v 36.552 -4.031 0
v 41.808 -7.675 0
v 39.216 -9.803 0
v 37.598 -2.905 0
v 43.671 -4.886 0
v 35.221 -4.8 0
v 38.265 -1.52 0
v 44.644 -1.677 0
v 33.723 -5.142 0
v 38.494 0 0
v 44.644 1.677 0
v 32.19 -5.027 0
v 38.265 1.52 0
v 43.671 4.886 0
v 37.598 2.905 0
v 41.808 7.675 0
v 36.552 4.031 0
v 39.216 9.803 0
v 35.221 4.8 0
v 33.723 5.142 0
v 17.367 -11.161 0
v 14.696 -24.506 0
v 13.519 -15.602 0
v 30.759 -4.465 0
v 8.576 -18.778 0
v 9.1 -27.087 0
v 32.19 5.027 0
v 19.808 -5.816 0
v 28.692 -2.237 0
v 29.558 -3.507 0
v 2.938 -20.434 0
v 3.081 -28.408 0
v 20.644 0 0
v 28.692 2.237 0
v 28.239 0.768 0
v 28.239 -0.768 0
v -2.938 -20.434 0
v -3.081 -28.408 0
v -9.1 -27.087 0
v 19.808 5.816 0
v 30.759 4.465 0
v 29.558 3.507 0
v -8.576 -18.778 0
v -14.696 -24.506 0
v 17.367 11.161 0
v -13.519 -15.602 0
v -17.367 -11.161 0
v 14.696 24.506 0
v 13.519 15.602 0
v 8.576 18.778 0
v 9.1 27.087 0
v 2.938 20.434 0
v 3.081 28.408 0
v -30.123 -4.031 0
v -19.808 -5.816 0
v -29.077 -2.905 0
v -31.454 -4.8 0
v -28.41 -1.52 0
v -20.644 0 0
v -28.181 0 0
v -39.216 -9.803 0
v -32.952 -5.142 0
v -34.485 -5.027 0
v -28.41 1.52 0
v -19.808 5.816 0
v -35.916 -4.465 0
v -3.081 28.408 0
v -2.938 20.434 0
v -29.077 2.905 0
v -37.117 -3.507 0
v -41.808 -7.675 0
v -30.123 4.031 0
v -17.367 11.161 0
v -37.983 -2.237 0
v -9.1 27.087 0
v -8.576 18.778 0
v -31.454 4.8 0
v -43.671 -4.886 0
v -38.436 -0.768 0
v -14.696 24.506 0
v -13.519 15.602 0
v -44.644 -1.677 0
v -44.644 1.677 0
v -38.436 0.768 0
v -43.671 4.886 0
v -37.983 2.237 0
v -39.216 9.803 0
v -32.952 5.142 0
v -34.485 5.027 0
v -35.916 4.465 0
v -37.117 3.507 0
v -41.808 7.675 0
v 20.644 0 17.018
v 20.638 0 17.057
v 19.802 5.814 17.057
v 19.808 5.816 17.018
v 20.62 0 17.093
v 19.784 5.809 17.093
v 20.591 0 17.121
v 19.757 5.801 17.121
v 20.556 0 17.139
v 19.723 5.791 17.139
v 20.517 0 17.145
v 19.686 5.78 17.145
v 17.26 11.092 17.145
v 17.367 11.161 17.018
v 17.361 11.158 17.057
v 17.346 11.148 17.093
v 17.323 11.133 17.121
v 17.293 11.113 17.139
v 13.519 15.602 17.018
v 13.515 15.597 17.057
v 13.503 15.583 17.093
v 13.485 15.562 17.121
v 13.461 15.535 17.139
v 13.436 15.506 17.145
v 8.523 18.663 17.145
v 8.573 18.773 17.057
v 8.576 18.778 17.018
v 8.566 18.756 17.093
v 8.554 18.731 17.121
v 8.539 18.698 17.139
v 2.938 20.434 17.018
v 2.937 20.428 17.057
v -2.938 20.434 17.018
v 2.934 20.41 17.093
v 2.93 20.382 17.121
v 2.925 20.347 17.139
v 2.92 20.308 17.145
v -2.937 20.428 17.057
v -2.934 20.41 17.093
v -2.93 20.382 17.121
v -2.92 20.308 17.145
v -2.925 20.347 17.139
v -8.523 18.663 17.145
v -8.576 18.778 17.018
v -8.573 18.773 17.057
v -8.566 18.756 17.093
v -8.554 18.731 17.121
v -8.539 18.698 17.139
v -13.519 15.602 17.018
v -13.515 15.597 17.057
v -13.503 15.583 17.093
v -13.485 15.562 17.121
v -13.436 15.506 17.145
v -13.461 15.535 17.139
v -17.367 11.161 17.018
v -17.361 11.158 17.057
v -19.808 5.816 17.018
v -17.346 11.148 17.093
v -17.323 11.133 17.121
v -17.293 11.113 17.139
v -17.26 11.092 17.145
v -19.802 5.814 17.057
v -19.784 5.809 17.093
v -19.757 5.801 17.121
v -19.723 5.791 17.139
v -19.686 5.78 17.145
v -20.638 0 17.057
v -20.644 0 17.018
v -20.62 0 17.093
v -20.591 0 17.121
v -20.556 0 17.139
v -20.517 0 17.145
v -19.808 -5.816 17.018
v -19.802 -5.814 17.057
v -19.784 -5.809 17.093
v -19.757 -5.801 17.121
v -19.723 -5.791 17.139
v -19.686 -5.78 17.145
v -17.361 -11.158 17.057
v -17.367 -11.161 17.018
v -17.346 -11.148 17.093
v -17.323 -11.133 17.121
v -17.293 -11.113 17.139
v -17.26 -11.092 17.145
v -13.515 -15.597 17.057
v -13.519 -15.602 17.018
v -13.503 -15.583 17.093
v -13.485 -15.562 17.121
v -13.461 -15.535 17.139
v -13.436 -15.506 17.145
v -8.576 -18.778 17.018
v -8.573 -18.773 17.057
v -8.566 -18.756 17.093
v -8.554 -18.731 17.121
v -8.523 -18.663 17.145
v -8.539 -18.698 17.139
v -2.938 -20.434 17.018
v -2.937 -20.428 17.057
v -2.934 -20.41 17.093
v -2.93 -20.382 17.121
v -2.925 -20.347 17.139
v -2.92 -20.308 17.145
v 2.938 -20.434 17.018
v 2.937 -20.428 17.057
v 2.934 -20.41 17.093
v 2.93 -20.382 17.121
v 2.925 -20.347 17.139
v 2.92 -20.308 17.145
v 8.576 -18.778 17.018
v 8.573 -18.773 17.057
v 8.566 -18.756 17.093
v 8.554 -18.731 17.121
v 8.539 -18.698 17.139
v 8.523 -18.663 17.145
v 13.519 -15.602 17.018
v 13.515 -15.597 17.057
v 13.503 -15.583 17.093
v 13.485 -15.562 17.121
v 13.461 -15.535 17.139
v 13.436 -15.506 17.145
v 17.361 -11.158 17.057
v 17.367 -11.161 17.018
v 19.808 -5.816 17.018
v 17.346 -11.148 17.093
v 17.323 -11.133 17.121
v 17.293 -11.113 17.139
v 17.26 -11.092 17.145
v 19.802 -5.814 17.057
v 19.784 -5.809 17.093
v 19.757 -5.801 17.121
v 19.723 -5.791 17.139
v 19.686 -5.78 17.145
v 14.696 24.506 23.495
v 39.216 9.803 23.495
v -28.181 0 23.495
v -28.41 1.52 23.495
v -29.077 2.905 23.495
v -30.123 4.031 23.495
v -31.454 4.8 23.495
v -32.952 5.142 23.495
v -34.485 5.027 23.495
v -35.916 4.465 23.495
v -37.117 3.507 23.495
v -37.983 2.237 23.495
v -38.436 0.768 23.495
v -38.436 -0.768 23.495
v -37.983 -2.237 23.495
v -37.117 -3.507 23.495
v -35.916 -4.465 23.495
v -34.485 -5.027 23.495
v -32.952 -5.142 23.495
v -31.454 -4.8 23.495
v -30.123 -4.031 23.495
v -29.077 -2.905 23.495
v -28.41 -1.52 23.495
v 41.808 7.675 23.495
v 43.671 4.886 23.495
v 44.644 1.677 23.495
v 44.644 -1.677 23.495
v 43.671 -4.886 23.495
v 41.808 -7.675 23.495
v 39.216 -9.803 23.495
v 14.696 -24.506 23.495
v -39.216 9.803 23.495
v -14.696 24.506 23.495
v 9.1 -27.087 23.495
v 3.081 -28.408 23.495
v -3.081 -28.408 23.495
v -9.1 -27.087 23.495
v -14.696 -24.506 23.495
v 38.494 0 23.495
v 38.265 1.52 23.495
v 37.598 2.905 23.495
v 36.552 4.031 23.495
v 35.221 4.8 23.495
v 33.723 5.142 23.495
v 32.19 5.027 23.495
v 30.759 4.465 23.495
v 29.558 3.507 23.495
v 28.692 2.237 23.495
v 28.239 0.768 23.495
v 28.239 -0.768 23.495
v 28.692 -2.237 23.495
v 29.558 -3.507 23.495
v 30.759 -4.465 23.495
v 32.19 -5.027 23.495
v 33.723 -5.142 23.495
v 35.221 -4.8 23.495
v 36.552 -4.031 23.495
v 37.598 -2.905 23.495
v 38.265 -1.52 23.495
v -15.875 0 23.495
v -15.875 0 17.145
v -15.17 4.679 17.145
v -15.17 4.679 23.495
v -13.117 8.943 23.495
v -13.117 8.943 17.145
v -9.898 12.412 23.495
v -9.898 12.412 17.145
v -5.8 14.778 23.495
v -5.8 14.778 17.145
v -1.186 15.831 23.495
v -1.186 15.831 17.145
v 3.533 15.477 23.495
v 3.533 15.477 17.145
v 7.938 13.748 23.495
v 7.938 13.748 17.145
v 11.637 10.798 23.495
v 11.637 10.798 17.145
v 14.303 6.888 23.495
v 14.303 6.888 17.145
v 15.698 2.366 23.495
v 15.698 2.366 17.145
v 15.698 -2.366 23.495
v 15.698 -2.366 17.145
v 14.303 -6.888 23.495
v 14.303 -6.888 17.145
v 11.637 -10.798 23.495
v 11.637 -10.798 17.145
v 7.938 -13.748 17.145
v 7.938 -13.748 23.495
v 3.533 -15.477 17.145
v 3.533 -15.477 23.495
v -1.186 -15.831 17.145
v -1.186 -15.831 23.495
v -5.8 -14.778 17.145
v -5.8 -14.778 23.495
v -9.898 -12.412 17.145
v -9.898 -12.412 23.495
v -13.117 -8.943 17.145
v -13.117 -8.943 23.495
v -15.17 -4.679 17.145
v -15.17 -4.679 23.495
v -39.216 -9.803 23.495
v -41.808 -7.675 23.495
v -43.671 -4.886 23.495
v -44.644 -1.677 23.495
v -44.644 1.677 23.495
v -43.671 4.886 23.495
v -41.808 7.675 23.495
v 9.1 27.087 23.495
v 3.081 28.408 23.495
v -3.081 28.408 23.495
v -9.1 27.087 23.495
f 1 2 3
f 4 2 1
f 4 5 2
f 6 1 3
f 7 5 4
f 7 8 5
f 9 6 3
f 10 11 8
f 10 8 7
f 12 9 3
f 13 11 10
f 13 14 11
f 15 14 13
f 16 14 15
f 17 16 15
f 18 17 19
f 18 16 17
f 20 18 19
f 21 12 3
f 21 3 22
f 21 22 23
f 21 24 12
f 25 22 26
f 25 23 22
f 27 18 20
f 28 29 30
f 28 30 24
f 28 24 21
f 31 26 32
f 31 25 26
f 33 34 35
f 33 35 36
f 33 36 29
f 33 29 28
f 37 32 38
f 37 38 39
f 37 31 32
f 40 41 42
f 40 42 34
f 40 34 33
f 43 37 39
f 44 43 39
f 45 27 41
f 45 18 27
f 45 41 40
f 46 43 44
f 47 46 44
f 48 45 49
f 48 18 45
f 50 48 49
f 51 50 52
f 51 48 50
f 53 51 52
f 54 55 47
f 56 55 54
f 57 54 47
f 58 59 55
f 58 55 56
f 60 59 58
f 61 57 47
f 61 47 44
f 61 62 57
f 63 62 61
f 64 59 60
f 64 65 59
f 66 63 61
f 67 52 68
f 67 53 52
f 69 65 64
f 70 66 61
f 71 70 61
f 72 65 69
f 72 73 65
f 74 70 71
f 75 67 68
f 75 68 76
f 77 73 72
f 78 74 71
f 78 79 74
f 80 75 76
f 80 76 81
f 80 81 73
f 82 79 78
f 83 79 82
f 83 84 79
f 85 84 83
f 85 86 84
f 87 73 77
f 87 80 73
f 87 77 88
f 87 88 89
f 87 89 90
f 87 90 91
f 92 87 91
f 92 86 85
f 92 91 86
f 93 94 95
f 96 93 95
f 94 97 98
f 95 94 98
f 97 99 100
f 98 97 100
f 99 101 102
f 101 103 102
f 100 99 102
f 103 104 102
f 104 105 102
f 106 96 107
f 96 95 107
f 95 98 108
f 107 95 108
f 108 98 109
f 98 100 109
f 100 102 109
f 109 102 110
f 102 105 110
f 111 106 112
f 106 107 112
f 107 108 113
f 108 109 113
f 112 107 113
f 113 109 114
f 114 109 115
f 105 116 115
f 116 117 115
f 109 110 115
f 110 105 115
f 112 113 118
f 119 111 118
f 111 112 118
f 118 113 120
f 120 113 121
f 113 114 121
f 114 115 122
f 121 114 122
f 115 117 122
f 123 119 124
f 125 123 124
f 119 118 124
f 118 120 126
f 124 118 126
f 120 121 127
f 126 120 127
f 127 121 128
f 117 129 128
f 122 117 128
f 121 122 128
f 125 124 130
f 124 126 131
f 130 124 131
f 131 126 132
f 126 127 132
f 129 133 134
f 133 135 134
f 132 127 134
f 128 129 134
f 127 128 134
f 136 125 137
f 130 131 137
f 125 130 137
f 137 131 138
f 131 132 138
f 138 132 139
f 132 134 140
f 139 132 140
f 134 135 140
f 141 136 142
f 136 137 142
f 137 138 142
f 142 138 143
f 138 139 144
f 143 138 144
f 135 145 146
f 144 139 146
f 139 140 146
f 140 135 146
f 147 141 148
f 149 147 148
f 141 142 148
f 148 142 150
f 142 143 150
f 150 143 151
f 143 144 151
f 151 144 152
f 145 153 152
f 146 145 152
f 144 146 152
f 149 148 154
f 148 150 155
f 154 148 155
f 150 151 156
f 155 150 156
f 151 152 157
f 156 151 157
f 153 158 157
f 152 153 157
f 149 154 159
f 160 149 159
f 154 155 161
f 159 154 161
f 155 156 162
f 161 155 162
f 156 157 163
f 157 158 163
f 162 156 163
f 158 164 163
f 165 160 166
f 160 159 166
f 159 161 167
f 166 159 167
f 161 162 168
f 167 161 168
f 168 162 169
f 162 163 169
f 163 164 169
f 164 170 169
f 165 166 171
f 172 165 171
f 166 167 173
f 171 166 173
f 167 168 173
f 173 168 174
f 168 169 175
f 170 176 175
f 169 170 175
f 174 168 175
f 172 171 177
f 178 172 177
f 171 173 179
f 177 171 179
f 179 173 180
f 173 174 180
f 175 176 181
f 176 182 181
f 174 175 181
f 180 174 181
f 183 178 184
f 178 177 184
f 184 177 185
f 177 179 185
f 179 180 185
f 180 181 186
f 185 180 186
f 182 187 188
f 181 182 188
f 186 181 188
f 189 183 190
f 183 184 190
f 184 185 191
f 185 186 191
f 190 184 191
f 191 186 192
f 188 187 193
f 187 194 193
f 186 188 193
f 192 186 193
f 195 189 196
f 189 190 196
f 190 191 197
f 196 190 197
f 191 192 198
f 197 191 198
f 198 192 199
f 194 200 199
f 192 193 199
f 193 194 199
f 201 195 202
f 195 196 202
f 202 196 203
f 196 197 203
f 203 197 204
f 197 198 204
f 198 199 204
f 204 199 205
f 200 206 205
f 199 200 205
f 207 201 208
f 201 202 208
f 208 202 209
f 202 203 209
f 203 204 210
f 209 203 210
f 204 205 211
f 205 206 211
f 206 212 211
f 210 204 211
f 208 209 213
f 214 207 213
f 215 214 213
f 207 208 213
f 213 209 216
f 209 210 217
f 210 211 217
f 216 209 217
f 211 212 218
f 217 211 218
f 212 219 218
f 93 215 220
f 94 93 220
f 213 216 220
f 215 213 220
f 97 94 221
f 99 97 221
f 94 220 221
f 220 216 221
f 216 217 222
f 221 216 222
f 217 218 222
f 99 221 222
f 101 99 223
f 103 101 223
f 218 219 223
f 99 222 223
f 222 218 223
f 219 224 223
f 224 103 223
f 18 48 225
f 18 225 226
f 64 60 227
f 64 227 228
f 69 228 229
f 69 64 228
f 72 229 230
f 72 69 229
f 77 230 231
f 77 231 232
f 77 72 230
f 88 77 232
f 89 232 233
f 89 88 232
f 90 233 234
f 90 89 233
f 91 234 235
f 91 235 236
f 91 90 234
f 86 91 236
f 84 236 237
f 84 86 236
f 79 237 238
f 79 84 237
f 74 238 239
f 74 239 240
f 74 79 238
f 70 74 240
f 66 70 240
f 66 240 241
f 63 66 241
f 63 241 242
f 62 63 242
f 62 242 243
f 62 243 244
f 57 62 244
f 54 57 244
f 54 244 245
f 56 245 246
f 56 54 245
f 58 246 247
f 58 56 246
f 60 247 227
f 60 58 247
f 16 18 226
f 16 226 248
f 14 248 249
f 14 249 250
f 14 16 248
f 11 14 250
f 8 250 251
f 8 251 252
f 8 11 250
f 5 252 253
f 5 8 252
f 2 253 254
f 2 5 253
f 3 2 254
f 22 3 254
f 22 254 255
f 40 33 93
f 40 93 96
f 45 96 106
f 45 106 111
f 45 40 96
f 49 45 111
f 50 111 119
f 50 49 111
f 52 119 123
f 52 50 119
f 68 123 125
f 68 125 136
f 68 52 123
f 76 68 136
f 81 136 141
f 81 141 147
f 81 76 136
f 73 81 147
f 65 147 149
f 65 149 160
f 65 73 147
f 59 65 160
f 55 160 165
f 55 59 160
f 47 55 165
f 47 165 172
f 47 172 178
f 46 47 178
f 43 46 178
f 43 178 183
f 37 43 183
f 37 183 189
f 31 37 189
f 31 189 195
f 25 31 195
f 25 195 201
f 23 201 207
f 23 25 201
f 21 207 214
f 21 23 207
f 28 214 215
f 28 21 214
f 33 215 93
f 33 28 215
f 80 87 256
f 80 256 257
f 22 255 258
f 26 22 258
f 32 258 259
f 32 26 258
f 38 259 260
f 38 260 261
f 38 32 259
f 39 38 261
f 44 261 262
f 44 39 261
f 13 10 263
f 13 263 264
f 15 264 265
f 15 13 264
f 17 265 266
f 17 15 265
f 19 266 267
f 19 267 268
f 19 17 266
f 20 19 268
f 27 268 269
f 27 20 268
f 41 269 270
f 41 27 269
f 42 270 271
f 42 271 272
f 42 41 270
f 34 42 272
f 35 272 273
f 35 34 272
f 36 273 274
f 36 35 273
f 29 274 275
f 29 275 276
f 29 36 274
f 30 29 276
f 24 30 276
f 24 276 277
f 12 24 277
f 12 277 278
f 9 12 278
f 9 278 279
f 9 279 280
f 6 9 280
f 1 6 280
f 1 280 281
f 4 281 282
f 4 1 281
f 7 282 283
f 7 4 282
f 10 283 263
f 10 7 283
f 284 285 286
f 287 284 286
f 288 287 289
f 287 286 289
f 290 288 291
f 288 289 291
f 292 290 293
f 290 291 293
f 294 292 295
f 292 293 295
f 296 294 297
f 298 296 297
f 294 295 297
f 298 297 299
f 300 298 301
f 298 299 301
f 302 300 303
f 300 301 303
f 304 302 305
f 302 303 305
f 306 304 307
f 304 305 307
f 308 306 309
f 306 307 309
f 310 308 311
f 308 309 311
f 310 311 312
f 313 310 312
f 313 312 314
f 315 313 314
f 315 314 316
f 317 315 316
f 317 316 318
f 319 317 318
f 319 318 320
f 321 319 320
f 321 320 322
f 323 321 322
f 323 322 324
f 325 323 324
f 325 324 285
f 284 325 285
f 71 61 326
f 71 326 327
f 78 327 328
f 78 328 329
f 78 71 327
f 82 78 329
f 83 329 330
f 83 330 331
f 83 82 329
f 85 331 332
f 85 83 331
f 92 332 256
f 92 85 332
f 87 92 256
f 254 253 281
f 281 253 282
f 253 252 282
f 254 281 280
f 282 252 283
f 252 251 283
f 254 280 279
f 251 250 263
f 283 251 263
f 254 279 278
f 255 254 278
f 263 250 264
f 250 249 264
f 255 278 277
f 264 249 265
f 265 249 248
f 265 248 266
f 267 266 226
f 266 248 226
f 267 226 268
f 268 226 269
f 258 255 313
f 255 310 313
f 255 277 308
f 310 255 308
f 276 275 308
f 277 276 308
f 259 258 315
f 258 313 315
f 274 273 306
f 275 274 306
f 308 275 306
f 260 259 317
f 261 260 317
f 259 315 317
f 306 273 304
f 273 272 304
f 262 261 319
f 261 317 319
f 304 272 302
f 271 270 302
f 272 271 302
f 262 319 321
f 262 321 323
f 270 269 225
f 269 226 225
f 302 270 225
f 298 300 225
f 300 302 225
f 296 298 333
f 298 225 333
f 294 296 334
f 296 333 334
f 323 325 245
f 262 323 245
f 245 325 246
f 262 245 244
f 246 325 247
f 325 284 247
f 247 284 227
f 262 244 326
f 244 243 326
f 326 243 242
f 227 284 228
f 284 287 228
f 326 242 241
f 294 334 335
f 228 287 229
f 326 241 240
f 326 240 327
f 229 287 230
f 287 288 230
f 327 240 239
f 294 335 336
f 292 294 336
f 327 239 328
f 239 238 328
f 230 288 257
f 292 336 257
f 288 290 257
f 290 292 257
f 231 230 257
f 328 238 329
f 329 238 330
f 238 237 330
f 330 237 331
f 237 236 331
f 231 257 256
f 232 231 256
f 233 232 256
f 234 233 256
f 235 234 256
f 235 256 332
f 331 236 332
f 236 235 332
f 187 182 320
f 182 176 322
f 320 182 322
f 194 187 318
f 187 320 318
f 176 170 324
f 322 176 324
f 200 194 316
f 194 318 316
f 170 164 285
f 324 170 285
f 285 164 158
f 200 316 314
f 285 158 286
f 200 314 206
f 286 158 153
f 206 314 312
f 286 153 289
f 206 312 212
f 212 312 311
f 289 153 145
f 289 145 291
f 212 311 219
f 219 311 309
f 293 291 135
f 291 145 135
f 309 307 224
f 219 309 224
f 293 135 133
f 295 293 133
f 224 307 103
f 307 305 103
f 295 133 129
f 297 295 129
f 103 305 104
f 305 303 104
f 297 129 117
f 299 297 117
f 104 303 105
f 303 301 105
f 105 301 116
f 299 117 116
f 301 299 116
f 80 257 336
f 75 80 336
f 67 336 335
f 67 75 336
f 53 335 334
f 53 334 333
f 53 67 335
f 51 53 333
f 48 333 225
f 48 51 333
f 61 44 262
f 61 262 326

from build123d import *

# Parameters (mm, degrees)
SKETCH1_R          = 5.1562
EXTRUDE1_DEPTH     = 23.495
SKETCH6_R          = 20.64385
CUT_EXTRUDE1_DEPTH = 17.145
SKETCH7_R          = 15.875
CUT_EXTRUDE2_DEPTH = 7.35
FILLET1_R          = 0.127


with BuildPart() as part:
    # Sketch1 → Extrude1 (new body)
    with BuildSketch(Plane.XY):
        with BuildLine():
            Line((-39.215785714, 9.802584203), (-14.695714286, 24.506460508))
            ThreePointArc((-14.695714286, 24.506460508), (0, 28.575), (14.695714286, 24.506460508))
            Line((14.695714286, 24.506460508), (39.215785714, 9.802584203))
            ThreePointArc((39.215785714, 9.802584203), (44.7675, 0), (39.215785714, -9.802584203))
            Line((39.215785714, -9.802584203), (14.695714286, -24.506460508))
            ThreePointArc((14.695714286, -24.506460508), (0, -28.575), (-14.695714286, -24.506460508))
            Line((-14.695714286, -24.506460508), (-39.215785714, -9.802584203))
            ThreePointArc((-39.215785714, -9.802584203), (-44.7675, 0), (-39.215785714, 9.802584203))
        make_face()
        with Locations((-33.3375, 0)):
            Circle(SKETCH1_R, mode=Mode.SUBTRACT)
        with Locations((33.3375, 0)):
            Circle(SKETCH1_R, mode=Mode.SUBTRACT)
    extrude(amount=EXTRUDE1_DEPTH)

    # Sketch6 → Cut-Extrude1 (cut)
    with BuildSketch(Plane.XY):
        Circle(SKETCH6_R)
    extrude(amount=CUT_EXTRUDE1_DEPTH, mode=Mode.SUBTRACT)

    # Sketch7 → Cut-Extrude2 (cut, through all)
    with BuildSketch(Plane(origin=(0, 0, 17.145), x_dir=(-1, 0, 0), z_dir=(0, 0, -1))):
        Circle(SKETCH7_R)
    extrude(amount=-CUT_EXTRUDE2_DEPTH, mode=Mode.SUBTRACT)

    # Fillet1
    fillet1_edges = [part.edges().sort_by_distance(p)[0] for p in [
        (-20.64385, 0, 17.145),
    ]]
    fillet(fillet1_edges, radius=FILLET1_R)


solid = part.part
